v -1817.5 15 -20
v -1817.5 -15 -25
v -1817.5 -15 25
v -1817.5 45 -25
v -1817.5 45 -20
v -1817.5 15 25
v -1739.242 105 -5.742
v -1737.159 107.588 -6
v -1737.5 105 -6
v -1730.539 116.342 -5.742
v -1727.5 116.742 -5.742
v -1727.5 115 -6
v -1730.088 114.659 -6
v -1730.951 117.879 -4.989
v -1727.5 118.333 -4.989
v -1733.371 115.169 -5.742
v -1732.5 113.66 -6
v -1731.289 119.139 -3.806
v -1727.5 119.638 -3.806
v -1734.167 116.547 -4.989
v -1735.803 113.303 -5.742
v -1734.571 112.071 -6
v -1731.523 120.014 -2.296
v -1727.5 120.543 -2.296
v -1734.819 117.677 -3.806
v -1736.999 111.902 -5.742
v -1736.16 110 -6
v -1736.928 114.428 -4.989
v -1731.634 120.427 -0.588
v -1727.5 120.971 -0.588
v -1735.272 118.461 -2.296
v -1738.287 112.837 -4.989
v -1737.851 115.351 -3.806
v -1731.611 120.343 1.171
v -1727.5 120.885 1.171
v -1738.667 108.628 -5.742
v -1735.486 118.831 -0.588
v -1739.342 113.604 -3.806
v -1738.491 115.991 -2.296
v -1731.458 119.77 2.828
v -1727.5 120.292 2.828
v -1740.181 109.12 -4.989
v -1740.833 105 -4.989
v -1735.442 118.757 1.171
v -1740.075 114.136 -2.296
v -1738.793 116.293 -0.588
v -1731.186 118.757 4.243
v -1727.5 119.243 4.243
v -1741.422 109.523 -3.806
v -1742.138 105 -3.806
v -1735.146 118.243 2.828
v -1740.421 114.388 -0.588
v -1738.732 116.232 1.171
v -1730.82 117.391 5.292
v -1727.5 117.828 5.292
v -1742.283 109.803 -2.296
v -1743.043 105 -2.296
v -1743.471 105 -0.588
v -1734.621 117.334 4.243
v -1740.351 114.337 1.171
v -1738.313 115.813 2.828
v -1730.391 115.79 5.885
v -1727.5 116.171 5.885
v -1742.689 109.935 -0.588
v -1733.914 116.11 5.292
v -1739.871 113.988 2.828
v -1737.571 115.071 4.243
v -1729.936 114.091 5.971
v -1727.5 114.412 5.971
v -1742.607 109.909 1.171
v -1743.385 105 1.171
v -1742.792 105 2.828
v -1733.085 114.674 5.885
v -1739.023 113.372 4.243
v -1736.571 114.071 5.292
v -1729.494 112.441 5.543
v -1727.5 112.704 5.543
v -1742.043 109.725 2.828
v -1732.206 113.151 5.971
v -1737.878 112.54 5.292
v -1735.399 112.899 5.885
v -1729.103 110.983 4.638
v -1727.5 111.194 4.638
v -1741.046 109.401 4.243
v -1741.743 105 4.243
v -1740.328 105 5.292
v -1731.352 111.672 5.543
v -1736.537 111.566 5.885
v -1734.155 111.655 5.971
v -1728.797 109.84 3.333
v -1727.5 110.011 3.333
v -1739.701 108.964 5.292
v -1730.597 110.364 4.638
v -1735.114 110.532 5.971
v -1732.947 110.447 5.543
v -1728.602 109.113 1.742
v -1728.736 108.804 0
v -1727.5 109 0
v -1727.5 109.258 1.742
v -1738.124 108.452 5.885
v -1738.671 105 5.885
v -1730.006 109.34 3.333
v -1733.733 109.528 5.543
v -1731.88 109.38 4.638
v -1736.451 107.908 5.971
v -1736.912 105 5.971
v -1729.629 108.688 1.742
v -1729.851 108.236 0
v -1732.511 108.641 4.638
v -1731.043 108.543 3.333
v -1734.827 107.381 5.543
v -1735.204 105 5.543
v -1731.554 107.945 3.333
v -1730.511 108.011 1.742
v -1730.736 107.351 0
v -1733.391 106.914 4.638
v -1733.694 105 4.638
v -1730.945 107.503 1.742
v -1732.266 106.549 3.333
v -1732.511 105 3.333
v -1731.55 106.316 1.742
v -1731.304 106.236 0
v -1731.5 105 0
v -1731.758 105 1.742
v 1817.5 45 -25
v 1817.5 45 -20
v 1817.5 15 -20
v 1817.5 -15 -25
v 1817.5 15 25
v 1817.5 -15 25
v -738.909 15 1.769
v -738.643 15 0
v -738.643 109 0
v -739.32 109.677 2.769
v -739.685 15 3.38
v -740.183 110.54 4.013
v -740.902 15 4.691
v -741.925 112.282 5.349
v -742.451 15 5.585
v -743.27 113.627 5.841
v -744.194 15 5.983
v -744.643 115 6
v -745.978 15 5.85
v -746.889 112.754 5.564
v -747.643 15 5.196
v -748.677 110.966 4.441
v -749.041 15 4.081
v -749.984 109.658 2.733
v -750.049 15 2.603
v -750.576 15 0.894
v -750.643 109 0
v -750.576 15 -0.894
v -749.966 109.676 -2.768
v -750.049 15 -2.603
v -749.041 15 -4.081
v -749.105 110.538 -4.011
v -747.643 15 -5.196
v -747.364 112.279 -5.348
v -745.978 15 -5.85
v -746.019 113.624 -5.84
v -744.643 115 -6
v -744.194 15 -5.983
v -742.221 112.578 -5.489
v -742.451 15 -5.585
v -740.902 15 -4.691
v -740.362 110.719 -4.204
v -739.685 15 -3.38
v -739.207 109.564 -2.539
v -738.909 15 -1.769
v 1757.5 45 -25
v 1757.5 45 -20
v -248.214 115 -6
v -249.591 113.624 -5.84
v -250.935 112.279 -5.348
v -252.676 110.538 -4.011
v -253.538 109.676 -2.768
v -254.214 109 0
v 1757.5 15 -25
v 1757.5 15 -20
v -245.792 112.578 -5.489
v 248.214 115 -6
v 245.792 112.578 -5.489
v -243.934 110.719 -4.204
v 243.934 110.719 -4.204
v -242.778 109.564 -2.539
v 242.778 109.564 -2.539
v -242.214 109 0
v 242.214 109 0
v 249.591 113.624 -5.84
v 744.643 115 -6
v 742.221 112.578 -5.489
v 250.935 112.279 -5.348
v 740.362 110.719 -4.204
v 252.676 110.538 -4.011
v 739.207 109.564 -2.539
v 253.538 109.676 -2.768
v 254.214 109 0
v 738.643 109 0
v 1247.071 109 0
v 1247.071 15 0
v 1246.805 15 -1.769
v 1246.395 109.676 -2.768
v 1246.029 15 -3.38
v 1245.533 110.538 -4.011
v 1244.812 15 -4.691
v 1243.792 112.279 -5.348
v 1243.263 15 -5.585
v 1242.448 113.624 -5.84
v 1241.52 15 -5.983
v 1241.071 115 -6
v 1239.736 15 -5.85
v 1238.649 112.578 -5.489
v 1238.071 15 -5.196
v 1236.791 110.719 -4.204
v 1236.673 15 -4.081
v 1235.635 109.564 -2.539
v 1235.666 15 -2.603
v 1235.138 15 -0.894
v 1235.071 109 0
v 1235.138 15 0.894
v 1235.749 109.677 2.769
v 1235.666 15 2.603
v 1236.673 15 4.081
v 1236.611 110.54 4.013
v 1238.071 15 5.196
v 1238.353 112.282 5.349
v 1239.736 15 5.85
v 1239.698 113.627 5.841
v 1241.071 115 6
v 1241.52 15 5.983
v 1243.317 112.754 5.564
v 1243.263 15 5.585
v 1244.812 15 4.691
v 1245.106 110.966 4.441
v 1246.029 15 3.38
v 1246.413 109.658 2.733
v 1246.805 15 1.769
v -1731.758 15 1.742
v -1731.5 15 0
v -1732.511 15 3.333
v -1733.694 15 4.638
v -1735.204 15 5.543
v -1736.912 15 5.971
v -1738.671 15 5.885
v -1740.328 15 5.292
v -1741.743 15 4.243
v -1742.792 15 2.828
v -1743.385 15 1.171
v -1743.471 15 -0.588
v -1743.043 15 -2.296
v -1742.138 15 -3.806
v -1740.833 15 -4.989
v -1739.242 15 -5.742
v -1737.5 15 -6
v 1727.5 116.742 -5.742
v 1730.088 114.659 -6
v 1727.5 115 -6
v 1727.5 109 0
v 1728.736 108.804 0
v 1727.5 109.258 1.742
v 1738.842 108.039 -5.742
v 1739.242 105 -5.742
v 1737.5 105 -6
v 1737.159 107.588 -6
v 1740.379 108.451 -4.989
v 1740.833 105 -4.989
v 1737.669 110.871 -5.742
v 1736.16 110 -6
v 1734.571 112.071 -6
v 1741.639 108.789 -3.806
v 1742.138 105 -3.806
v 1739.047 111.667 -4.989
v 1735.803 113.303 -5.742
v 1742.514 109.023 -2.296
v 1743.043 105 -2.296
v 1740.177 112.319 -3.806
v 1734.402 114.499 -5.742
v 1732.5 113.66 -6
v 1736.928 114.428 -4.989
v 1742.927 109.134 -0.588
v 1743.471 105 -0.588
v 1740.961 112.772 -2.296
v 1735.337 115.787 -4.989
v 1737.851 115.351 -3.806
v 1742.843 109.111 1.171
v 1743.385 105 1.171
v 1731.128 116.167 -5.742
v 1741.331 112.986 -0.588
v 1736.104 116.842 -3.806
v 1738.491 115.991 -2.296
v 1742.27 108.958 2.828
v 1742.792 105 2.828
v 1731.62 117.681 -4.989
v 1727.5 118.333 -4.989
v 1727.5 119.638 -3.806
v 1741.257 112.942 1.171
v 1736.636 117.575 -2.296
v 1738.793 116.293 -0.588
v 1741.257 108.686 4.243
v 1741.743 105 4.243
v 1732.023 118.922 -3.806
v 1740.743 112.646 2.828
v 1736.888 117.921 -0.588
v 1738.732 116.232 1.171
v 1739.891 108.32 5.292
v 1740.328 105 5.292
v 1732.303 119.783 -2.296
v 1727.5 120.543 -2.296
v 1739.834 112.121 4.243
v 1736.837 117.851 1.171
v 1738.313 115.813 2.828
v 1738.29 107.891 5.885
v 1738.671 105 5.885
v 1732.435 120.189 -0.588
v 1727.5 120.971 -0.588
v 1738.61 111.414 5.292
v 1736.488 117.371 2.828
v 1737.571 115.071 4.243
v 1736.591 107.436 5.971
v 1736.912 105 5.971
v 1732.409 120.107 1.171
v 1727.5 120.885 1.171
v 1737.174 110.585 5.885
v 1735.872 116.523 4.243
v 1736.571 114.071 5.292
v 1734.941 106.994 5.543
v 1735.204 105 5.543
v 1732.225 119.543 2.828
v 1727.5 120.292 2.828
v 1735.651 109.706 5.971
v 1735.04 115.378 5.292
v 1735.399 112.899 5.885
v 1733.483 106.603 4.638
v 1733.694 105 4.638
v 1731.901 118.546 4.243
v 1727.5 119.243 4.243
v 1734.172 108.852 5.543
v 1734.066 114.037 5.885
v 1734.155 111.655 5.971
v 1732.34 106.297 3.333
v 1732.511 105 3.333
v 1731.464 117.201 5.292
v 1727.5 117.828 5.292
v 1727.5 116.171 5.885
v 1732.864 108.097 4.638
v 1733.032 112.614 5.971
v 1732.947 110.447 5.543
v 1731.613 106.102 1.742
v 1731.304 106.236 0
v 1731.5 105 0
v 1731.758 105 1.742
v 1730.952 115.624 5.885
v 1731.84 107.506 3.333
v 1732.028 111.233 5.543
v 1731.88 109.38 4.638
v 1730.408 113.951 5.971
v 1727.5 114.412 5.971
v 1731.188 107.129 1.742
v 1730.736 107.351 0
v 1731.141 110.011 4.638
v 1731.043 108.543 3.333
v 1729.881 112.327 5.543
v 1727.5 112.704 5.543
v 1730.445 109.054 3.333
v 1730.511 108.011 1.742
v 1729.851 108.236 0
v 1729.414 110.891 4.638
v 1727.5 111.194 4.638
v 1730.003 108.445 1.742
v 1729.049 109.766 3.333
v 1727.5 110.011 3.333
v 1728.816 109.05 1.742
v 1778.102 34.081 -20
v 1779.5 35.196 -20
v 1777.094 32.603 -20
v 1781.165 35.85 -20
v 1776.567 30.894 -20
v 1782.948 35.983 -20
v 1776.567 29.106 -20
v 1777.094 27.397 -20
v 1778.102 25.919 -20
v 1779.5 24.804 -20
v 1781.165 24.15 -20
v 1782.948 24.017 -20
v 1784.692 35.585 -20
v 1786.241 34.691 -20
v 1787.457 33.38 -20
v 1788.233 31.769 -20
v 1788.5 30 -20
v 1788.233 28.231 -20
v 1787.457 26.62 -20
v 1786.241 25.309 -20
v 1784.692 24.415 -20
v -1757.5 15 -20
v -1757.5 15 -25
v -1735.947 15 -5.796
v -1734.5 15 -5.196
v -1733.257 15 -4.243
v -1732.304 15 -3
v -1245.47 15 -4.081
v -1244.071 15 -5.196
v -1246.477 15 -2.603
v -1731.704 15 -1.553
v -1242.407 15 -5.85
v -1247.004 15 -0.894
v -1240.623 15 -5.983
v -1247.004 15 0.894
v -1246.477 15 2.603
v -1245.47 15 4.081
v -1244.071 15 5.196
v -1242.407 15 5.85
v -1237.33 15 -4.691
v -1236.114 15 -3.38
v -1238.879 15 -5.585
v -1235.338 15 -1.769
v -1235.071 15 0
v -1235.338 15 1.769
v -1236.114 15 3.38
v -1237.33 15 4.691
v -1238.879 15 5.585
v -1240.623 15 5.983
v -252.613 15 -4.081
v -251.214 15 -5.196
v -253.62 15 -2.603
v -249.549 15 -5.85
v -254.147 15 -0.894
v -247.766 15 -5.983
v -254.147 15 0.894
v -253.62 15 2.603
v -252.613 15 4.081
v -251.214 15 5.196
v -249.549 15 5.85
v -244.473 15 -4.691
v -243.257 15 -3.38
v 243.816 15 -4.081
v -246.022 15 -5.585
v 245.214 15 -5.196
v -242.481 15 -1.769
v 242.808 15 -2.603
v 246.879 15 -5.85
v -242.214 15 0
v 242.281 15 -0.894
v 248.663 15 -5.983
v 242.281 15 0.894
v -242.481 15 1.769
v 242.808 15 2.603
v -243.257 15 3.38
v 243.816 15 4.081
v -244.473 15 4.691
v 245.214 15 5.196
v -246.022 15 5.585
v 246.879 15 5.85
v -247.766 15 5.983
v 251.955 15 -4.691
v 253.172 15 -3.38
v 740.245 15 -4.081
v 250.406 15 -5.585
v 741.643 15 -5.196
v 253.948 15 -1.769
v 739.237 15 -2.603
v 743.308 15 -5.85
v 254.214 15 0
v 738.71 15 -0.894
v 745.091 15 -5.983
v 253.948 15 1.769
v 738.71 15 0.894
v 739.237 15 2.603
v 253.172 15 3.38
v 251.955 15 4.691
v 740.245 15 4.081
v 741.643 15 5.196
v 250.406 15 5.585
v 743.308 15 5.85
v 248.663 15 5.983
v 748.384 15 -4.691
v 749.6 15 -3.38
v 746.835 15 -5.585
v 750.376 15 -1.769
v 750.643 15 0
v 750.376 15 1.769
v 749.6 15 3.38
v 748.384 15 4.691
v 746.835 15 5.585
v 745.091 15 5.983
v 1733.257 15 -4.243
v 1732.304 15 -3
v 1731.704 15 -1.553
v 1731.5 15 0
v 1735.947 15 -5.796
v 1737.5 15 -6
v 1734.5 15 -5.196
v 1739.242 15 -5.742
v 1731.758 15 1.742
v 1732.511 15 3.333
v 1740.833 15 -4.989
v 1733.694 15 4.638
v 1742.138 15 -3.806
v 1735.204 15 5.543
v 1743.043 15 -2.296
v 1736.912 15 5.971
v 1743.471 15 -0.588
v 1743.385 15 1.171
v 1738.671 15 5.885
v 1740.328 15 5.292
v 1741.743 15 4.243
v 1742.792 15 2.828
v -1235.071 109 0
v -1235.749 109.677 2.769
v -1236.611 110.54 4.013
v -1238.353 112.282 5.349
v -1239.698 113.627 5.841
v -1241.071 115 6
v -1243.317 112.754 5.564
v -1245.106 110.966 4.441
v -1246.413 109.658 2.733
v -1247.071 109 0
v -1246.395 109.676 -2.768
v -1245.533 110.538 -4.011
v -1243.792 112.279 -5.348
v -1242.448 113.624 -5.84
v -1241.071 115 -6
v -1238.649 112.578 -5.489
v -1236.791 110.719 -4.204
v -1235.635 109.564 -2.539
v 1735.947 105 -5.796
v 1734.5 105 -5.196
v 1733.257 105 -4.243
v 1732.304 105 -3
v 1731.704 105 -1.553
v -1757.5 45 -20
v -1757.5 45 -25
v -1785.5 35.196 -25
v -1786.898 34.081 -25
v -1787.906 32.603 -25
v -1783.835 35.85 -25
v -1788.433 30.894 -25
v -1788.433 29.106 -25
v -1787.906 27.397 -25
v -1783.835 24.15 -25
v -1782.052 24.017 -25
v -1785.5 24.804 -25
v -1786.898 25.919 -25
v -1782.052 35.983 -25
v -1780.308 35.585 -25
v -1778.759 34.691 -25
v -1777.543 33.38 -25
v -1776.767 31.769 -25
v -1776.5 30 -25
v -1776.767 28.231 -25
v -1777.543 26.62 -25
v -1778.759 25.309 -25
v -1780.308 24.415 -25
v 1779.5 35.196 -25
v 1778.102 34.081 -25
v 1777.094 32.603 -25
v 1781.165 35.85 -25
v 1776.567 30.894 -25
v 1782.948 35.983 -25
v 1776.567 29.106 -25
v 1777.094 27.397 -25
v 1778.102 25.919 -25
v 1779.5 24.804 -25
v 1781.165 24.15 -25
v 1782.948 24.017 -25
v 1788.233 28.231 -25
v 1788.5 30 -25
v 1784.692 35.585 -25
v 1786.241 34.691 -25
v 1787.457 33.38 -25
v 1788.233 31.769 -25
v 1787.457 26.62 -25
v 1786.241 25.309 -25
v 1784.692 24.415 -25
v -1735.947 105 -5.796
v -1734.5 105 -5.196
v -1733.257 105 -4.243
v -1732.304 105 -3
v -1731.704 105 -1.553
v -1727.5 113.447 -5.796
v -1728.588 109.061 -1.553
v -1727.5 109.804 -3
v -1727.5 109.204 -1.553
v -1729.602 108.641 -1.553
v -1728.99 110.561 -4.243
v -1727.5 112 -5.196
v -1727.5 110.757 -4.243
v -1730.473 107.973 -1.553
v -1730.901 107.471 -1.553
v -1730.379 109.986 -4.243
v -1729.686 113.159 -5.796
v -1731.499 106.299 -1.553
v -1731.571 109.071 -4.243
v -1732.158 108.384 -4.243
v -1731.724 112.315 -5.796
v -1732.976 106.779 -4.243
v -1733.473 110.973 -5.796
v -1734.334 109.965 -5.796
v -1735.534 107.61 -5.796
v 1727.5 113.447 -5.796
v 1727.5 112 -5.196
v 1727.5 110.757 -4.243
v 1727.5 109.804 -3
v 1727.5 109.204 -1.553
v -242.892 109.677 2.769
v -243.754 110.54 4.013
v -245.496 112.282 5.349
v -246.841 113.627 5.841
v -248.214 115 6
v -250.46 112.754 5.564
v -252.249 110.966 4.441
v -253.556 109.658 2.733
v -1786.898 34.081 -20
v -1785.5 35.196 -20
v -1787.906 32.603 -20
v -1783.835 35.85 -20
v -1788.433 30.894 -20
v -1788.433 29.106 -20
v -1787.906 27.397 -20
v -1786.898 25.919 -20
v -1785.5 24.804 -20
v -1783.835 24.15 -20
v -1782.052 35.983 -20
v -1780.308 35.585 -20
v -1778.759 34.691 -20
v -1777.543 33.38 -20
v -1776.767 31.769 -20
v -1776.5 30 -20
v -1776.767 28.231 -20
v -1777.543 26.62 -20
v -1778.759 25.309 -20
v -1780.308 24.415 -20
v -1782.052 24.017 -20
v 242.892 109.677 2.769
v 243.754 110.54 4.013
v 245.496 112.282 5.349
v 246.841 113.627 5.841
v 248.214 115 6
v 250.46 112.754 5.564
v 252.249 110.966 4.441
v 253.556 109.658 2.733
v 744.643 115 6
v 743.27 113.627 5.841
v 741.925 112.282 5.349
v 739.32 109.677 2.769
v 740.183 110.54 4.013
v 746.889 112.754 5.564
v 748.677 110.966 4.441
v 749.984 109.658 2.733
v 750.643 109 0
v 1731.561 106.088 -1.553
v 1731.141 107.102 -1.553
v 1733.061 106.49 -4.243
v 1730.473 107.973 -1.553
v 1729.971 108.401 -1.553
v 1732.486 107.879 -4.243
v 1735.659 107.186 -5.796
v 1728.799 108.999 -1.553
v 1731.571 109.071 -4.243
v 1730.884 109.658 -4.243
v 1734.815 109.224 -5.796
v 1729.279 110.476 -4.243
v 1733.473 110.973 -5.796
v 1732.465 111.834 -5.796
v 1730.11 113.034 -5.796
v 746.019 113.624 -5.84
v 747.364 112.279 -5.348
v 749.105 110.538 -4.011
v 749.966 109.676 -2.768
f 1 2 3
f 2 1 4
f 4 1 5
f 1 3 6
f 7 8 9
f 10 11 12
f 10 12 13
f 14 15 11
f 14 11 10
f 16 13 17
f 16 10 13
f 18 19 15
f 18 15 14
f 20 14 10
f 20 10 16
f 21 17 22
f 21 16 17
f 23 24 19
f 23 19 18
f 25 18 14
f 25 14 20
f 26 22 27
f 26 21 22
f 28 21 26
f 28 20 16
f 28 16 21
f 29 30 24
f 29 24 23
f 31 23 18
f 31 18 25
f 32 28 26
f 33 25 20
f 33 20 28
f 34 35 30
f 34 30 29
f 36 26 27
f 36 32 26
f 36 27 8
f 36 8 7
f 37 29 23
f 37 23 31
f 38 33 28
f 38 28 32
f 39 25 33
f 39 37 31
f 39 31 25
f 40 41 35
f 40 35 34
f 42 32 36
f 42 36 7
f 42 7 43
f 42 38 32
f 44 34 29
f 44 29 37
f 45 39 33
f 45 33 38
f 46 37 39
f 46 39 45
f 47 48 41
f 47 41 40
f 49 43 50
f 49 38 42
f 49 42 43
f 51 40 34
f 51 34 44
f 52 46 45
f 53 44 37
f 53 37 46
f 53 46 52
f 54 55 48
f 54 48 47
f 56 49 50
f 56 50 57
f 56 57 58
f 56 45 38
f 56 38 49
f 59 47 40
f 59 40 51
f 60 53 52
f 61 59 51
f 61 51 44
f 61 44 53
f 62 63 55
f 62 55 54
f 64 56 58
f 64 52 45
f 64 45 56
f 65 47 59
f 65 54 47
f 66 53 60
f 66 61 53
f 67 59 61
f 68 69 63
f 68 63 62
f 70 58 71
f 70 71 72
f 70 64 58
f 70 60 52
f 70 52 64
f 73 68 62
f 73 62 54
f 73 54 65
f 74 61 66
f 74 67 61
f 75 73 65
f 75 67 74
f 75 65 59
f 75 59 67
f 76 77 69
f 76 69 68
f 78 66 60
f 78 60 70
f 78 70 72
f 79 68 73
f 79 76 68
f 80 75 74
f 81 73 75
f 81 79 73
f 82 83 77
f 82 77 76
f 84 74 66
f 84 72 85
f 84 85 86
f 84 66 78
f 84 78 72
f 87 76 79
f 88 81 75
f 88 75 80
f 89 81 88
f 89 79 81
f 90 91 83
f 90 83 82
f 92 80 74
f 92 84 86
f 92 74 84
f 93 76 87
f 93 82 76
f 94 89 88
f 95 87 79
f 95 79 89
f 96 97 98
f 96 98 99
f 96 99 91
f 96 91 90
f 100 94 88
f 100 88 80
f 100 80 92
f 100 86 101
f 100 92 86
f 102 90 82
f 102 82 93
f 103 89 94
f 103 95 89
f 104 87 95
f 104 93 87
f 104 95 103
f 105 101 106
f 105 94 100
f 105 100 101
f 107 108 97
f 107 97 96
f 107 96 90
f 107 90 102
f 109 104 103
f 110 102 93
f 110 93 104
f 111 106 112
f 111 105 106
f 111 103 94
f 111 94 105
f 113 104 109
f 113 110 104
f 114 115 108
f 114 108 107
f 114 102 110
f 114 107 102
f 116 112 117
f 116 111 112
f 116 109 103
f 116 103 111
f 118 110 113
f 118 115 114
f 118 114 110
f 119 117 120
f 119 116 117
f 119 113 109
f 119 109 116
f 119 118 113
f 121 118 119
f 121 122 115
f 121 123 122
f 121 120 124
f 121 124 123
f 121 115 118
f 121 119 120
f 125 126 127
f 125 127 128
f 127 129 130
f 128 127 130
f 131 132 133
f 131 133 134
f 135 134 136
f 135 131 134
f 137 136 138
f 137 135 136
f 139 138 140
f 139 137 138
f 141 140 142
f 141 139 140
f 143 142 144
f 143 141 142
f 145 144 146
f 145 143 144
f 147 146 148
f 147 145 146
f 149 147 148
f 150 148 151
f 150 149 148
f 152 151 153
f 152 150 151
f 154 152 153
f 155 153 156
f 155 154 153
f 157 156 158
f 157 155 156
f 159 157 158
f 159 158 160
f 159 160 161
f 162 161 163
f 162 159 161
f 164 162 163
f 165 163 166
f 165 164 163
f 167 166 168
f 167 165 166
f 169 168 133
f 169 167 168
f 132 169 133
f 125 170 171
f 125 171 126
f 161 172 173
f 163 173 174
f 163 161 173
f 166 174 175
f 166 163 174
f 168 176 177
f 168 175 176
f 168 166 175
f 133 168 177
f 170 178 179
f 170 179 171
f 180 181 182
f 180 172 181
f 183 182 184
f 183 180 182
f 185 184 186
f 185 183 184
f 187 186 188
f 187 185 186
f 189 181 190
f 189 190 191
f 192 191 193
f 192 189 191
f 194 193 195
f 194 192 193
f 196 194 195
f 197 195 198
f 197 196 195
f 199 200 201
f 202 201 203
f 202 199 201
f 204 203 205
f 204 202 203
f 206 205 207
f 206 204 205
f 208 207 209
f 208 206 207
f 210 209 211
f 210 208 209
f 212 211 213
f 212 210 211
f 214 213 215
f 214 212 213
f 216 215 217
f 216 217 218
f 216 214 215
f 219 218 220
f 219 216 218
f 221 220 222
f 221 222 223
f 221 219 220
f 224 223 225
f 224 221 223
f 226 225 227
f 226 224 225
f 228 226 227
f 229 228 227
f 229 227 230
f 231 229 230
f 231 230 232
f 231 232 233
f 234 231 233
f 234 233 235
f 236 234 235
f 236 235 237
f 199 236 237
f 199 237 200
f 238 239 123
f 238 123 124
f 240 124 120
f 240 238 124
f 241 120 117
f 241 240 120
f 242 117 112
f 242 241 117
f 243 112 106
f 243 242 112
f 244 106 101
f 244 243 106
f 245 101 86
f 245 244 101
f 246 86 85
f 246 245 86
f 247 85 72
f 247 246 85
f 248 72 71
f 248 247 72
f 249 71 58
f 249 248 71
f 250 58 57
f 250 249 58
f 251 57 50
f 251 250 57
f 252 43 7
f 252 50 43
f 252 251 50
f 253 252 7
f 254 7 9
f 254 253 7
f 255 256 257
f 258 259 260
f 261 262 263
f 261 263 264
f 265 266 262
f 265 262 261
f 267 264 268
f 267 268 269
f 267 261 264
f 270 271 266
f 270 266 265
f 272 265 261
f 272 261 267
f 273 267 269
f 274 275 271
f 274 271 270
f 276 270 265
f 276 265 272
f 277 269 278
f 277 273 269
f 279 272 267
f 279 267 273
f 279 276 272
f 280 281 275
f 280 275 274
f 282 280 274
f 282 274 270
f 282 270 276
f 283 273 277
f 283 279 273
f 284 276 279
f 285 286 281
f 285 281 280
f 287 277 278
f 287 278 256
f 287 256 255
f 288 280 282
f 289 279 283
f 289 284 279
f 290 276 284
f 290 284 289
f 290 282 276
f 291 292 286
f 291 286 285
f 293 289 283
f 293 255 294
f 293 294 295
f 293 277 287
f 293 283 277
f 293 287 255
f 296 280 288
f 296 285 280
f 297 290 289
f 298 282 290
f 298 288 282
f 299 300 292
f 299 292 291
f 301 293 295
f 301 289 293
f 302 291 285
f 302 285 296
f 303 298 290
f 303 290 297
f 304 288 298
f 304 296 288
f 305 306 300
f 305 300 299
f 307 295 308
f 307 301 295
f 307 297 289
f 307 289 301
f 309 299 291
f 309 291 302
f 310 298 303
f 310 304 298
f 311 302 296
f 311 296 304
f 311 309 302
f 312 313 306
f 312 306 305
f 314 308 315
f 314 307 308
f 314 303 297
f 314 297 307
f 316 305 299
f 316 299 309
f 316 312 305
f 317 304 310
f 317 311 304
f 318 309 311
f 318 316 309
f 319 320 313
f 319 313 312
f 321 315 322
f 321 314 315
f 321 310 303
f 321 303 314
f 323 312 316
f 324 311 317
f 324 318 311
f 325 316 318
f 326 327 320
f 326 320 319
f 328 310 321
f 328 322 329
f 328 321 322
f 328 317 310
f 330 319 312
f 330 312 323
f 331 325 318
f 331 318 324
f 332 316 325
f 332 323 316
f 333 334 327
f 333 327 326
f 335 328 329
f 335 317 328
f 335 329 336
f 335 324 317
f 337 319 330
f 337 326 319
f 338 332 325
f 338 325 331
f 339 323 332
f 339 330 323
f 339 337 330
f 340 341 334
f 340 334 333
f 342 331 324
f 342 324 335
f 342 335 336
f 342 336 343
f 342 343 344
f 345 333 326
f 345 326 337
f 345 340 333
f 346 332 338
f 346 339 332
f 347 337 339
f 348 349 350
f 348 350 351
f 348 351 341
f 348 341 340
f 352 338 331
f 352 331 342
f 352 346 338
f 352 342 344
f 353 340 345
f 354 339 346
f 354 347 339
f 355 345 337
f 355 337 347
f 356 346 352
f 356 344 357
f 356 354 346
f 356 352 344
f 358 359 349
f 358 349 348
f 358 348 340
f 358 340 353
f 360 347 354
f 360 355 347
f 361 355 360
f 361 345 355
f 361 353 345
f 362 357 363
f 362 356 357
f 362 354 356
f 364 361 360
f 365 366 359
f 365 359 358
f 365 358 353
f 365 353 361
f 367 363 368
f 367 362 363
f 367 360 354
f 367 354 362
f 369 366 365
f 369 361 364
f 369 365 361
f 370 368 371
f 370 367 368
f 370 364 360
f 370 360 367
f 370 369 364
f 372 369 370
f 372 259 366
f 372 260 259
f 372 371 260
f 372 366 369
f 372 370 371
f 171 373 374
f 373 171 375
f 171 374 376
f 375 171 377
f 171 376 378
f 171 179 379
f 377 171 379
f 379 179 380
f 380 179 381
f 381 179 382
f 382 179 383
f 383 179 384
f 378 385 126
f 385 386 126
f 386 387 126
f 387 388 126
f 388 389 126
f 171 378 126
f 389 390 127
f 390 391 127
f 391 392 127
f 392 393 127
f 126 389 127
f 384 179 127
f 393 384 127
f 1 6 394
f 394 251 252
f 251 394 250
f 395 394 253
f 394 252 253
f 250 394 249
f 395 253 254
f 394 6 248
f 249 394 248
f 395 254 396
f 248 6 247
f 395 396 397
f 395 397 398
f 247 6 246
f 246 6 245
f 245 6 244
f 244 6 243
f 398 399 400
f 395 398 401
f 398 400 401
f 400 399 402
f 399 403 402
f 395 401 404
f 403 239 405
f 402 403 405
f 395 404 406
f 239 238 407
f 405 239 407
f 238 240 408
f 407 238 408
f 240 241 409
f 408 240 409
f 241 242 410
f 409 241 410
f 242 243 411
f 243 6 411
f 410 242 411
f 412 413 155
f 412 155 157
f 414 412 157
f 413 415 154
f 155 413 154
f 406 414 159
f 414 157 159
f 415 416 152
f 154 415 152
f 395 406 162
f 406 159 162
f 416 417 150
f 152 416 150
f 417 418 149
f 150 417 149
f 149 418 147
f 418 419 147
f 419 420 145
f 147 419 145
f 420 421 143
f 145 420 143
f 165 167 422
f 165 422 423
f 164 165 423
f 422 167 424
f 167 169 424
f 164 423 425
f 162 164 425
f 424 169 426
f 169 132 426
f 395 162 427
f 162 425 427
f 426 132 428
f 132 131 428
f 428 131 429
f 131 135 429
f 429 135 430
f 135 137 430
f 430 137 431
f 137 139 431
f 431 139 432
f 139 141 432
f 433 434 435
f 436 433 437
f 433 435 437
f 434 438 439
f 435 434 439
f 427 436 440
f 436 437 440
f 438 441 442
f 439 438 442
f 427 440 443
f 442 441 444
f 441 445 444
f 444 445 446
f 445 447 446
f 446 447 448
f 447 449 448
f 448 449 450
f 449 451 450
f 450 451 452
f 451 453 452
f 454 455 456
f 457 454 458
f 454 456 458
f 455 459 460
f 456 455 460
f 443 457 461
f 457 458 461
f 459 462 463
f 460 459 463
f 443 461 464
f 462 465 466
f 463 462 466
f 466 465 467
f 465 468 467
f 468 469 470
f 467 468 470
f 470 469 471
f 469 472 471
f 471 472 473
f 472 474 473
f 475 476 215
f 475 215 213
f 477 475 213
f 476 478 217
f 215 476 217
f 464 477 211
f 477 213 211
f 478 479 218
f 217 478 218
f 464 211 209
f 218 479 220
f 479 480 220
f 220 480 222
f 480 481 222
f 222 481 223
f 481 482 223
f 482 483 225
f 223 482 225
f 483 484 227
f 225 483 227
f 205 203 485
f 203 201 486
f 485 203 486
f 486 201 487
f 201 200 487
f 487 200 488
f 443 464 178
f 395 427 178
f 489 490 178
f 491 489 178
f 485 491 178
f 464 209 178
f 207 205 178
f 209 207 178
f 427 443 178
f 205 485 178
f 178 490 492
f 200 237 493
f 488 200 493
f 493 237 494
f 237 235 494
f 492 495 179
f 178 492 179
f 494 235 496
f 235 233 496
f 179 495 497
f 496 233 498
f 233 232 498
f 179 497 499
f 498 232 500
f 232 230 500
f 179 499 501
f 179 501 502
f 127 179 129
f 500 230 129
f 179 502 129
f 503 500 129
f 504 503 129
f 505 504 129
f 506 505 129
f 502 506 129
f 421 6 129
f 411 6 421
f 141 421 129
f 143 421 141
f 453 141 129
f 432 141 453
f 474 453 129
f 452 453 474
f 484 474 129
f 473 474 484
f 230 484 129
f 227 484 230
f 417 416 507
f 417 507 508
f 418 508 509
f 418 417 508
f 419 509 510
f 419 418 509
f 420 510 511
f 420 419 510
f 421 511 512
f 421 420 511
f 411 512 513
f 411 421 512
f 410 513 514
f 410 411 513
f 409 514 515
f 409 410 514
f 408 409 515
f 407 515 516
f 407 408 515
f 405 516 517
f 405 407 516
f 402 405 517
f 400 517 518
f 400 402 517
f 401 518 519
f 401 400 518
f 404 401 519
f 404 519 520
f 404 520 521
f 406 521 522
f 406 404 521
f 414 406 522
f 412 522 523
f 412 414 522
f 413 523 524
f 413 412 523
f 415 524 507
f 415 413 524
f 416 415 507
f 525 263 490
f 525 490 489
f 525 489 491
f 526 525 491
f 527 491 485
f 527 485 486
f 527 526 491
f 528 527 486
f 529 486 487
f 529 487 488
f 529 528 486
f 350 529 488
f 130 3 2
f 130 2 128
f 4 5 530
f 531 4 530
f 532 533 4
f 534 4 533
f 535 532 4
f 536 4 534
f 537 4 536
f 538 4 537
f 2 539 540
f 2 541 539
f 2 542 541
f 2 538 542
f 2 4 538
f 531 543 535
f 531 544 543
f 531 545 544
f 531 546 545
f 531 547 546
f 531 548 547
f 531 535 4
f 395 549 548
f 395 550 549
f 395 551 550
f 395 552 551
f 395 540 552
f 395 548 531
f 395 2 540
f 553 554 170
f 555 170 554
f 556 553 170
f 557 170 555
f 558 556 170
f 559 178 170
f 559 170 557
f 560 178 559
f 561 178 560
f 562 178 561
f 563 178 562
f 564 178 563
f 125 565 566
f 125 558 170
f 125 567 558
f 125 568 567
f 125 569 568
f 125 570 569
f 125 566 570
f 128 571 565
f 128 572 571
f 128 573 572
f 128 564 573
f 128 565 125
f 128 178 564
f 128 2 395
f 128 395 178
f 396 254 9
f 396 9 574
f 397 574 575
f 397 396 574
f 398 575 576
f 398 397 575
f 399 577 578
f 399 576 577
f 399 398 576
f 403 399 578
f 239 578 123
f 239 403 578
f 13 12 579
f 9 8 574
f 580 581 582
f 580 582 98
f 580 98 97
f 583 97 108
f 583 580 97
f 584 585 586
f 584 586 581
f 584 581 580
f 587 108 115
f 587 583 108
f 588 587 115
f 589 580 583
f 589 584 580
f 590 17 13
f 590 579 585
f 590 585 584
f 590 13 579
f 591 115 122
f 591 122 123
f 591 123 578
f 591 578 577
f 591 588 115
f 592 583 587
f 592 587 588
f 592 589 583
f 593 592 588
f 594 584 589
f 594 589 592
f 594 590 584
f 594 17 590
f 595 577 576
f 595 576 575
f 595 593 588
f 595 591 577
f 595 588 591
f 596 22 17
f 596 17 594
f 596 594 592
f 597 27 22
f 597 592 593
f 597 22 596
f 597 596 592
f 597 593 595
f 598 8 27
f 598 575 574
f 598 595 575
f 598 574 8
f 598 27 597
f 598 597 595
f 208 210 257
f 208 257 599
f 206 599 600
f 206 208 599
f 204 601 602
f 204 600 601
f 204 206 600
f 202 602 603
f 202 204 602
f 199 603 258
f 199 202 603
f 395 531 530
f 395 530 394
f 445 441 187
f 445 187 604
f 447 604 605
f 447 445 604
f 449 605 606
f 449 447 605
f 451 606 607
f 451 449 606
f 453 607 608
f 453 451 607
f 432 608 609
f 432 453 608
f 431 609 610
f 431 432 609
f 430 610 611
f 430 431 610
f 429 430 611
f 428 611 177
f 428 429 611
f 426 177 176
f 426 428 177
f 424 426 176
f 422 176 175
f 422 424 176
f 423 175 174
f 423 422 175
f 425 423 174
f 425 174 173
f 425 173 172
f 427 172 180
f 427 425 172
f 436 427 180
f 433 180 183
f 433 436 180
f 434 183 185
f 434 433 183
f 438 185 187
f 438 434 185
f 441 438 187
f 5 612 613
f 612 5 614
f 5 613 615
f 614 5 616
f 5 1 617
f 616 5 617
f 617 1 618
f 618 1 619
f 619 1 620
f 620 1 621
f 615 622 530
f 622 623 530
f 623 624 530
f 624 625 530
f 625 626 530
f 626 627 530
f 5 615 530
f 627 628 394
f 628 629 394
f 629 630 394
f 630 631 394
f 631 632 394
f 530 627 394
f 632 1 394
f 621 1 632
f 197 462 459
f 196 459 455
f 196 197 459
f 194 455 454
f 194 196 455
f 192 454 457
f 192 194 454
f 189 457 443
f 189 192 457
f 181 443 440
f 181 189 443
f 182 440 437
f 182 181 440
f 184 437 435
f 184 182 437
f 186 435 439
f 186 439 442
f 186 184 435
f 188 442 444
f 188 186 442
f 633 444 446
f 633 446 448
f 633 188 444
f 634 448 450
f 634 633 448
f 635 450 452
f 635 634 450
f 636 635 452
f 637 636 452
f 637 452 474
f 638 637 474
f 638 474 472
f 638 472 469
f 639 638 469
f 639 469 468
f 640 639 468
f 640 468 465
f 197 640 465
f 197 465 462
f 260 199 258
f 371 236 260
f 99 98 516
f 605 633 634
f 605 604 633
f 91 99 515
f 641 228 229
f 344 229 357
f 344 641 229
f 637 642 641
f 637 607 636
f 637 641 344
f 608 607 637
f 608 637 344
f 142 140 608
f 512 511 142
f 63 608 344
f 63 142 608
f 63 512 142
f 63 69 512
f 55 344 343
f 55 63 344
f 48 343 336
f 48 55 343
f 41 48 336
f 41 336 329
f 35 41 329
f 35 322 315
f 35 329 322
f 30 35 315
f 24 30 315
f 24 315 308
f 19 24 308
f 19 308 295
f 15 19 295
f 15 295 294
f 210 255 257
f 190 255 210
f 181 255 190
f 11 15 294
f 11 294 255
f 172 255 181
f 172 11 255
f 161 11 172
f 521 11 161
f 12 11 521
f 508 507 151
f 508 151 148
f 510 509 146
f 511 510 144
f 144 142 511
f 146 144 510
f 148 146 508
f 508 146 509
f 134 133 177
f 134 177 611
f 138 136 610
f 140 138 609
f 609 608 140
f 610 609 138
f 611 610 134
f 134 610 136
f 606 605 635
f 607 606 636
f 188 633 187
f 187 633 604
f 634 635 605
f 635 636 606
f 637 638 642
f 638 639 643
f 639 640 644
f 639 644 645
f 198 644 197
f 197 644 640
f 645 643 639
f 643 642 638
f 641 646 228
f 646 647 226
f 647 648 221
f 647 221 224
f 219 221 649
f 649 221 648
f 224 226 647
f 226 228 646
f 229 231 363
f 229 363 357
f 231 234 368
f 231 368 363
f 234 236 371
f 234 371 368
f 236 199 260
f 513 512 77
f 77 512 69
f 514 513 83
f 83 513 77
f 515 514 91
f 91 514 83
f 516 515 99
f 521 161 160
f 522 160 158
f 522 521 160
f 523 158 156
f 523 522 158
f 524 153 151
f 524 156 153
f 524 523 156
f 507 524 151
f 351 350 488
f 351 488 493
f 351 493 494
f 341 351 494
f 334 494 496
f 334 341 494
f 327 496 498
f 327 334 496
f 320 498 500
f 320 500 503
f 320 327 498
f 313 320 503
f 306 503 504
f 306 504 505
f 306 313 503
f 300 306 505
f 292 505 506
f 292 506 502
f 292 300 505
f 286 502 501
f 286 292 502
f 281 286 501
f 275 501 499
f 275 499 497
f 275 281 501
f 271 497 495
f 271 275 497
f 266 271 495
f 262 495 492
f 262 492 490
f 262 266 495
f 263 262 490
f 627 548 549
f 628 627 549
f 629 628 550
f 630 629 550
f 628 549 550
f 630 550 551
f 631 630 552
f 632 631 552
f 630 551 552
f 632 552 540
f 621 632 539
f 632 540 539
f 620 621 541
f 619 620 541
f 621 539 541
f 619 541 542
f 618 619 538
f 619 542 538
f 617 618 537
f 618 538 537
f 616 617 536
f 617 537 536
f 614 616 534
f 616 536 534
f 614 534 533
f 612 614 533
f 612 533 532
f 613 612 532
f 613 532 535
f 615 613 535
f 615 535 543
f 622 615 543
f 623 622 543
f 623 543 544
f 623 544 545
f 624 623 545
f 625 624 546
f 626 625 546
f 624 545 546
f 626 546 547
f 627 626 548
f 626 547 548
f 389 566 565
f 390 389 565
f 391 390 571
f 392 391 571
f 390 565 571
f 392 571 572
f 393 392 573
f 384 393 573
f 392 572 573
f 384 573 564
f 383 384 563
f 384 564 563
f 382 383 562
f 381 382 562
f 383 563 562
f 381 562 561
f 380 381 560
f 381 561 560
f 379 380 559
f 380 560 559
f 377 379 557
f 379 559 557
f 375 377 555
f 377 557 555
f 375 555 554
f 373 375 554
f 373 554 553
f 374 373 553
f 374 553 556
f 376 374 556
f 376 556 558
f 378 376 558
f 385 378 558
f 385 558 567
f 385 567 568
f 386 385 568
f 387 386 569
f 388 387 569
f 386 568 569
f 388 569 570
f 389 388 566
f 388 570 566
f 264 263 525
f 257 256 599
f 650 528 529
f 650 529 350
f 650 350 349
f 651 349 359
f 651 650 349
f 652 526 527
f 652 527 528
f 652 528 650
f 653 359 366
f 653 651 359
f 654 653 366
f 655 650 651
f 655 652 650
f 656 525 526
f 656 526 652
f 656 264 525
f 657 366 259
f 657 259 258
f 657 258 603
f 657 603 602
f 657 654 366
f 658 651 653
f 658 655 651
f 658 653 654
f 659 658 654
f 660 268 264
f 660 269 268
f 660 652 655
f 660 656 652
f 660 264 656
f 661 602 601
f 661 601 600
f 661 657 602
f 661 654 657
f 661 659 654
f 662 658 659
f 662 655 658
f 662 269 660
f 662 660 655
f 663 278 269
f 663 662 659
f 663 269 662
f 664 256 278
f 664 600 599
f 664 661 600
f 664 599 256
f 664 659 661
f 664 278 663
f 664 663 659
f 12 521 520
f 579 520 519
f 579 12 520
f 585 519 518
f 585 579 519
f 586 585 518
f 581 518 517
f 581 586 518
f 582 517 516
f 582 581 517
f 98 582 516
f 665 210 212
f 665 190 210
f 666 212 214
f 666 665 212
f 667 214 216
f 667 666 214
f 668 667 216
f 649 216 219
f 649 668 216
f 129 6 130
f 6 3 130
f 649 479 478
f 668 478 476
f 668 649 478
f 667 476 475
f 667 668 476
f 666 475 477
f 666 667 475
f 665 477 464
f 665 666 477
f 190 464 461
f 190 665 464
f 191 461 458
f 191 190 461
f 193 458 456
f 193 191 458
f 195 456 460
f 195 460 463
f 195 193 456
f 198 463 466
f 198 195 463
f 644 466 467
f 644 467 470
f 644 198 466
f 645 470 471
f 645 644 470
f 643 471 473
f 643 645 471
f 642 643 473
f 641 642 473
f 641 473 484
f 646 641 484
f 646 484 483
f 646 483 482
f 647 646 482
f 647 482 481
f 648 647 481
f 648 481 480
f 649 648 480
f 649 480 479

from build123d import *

# Parameters (mm, degrees)
F0_W          = 3635
F0_H          = 50
F1_DEPTH      = 15
F1_DEPTH_BACK = 15
F2_W          = 60
F2_H          = 30
F3_DEPTH      = 5
F4_W          = 60
F4_H          = 30
F4_H_2        = 15
F5_DEPTH      = 5
F6_R          = 6
F7_DEPTH      = 5
F9_DEPTH      = 5
F10_DEPTH     = 5
F11_DEPTH     = 5


# Not quite as in the source:
# - a feature names something its author has since deleted; it is built from what else it names


with BuildPart() as f1:
    # F0 (on Front) → F1 (new body, two sides)
    with BuildSketch(Plane.XZ) as f1_sk:
        Rectangle(F0_W, F0_H)
    extrude(amount=F1_DEPTH)
    extrude(f1_sk.sketch, amount=-F1_DEPTH_BACK)

    # F2 (on face) → F3 (join)
    with BuildSketch(Plane(origin=(0, 0, -25), x_dir=(1, 0, 0), z_dir=(0, 0, -1))):
        with Locations((-1787.5, -30)):
            Rectangle(F2_W, F2_H)
        Polygon((-1757.5, 15), (-1817.5, 15), (-1817.5, 0), (-1817.5, -15), (-1757.5, -15), align=None)
    extrude(amount=F3_DEPTH)

    # F4 (on face) → F5 (join)
    with BuildSketch(Plane(origin=(0, 0, -25), x_dir=(1, 0, 0), z_dir=(0, 0, -1))):
        with Locations((1787.5, -30)):
            Rectangle(F4_W, F4_H)
        with Locations((1787.5, -7.5)):
            Rectangle(F4_W, F4_H_2)
        with Locations((1787.5, 7.5)):
            Rectangle(F4_W, F4_H_2)
    extrude(amount=F5_DEPTH)

    # F6 (on face) → F7 (cut, through all)
    with BuildSketch(Plane(origin=(0, 0, -30), x_dir=(1, 0, 0), z_dir=(0, 0, -1))):
        with Locations((1782.5, -30)):
            Circle(F6_R)
    extrude(amount=-F7_DEPTH, mode=Mode.SUBTRACT)

    # F8 (on face) → F9 (cut, through all)
    with BuildSketch(Plane(origin=(0, 0, -30), x_dir=(1, 0, 0), z_dir=(0, 0, -1))):
        with BuildLine():
            ThreePointArc((-1788.5, -30), (-1782.5, -36), (-1776.5, -30))
            ThreePointArc((-1776.5, -30), (-1782.5, -24), (-1788.5, -30))
        make_face()
    extrude(amount=-F9_DEPTH, mode=Mode.SUBTRACT)

    # F10 (add): faces of the model
    f10_faces = [f1.faces().sort_by_distance(p)[0] for p in [
        (1787.5, 44.3291796068, -25),
        (-1816.8291796068, 30, -25),
    ]]
    extrude(f10_faces, amount=F10_DEPTH)

    # F11 (cut): faces of the model
    f11_faces = [f1.faces().sort_by_distance(p)[0] for p in [
        (-1787.6621744947, 14.5134765159, -30),
        (1787.6621744947, 14.5134765159, -30),
    ]]
    extrude(f11_faces, amount=-F11_DEPTH, mode=Mode.SUBTRACT)

    # F14: sweep along a path in F13
    with BuildLine(Plane.XY) as f14_path:
        Line((1737.5, 15), (1737.5, 105))
        ThreePointArc((1737.5, 105), (1734.5710678119, 112.0710678119), (1727.5, 115))
        Line((1727.5, 115), (-1727.5, 115))
        ThreePointArc((-1727.5, 115), (-1734.5710678119, 112.0710678119), (-1737.5, 105))
        Line((-1737.5, 105), (-1737.5, 15))
    # F12 (on face) → F14 (sweep)
    with BuildSketch(Plane(origin=(0, 15, 0), x_dir=(-1, 0, 0), z_dir=(0, 1, 0))):
        with BuildLine():
            ThreePointArc((-1731.5, 0), (-1741.7426406871, 4.2426406871), (-1737.5, -6))
            Line((-1737.5, -6), (-1737.5, 0))
            Line((-1737.5, 0), (-1731.5, 0))
        make_face()
        with BuildLine():
            Line((-1737.5, 0), (-1737.5, -6))
            ThreePointArc((-1737.5, -6), (-1733.2573593129, -4.2426406871), (-1731.5, 0))
            Line((-1731.5, 0), (-1737.5, 0))
        make_face()
    sweep(path=f14_path.line)

    # F15: sweep along a path in F13
    with BuildLine(Plane.XY) as f15_path:
        Line((-1241.0714285714, 115), (-1241.0714285714, 15))
    # F12 (on face) → F15 (sweep)
    with BuildSketch(Plane(origin=(0, 15, 0), x_dir=(-1, 0, 0), z_dir=(0, 1, 0))):
        with BuildLine():
            ThreePointArc((1247.0714285714, 0), (1241.0714285714, 6), (1235.0714285714, 0))
            Line((1235.0714285714, 0), (1241.0714285714, 0))
            Line((1241.0714285714, 0), (1247.0714285714, 0))
        make_face()
        with BuildLine():
            Line((1241.0714285714, 0), (1235.0714285714, 0))
            ThreePointArc((1235.0714285714, 0), (1241.0714285714, -6), (1247.0714285714, 0))
            Line((1247.0714285714, 0), (1241.0714285714, 0))
        make_face()
    sweep(path=f15_path.line)

    # F16: sweep along a path in F13
    with BuildLine(Plane.XY) as f16_path:
        Line((-744.6428571429, 115), (-744.6428571429, 15))
    # F12 (on face) → F16 (sweep)
    with BuildSketch(Plane(origin=(0, 15, 0), x_dir=(-1, 0, 0), z_dir=(0, 1, 0))):
        with BuildLine():
            ThreePointArc((750.6428571429, 0), (744.6428571429, 6), (738.6428571429, 0))
            Line((738.6428571429, 0), (744.6428571429, 0))
            Line((744.6428571429, 0), (750.6428571429, 0))
        make_face()
        with BuildLine():
            Line((744.6428571429, 0), (738.6428571429, 0))
            ThreePointArc((738.6428571429, 0), (744.6428571429, -6), (750.6428571429, 0))
            Line((750.6428571429, 0), (744.6428571429, 0))
        make_face()
    sweep(path=f16_path.line)

    # F17: sweep along a path in F13
    with BuildLine(Plane.XY) as f17_path:
        Line((-248.2142857143, 115), (-248.2142857143, 15))
    # F12 (on face) → F17 (sweep)
    with BuildSketch(Plane(origin=(0, 15, 0), x_dir=(-1, 0, 0), z_dir=(0, 1, 0))):
        with BuildLine():
            ThreePointArc((254.2142857143, 0), (248.2142857143, 6), (242.2142857143, 0))
            Line((242.2142857143, 0), (248.2142857143, 0))
            Line((248.2142857143, 0), (254.2142857143, 0))
        make_face()
        with BuildLine():
            Line((248.2142857143, 0), (242.2142857143, 0))
            ThreePointArc((242.2142857143, 0), (248.2142857143, -6), (254.2142857143, 0))
            Line((254.2142857143, 0), (248.2142857143, 0))
        make_face()
    sweep(path=f17_path.line)

    # F18: sweep along a path in F13
    with BuildLine(Plane.XY) as f18_path:
        Line((248.2142857143, 15), (248.2142857143, 115))
    # F12 (on face) → F18 (sweep)
    with BuildSketch(Plane(origin=(0, 15, 0), x_dir=(-1, 0, 0), z_dir=(0, 1, 0))):
        with BuildLine():
            ThreePointArc((-242.2142857143, 0), (-248.2142857143, 6), (-254.2142857143, 0))
            Line((-254.2142857143, 0), (-248.2142857143, 0))
            Line((-248.2142857143, 0), (-242.2142857143, 0))
        make_face()
        with BuildLine():
            Line((-248.2142857143, 0), (-254.2142857143, 0))
            ThreePointArc((-254.2142857143, 0), (-248.2142857143, -6), (-242.2142857143, 0))
            Line((-242.2142857143, 0), (-248.2142857143, 0))
        make_face()
    sweep(path=f18_path.line)

    # F19: sweep along a path in F13
    with BuildLine(Plane.XY) as f19_path:
        Line((744.6428571429, 15), (744.6428571429, 115))
    # F12 (on face) → F19 (sweep)
    with BuildSketch(Plane(origin=(0, 15, 0), x_dir=(-1, 0, 0), z_dir=(0, 1, 0))):
        with BuildLine():
            ThreePointArc((-738.6428571429, 0), (-744.6428571429, 6), (-750.6428571429, 0))
            Line((-750.6428571429, 0), (-744.6428571429, 0))
            Line((-744.6428571429, 0), (-738.6428571429, 0))
        make_face()
        with BuildLine():
            Line((-744.6428571429, 0), (-750.6428571429, 0))
            ThreePointArc((-750.6428571429, 0), (-744.6428571429, -6), (-738.6428571429, 0))
            Line((-738.6428571429, 0), (-744.6428571429, 0))
        make_face()
    sweep(path=f19_path.line)

    # F20: sweep along a path in F13
    with BuildLine(Plane.XY) as f20_path:
        Line((1241.0714285714, 15), (1241.0714285714, 115))
    # F12 (on face) → F20 (sweep)
    with BuildSketch(Plane(origin=(0, 15, 0), x_dir=(-1, 0, 0), z_dir=(0, 1, 0))):
        with BuildLine():
            ThreePointArc((-1235.0714285714, 0), (-1241.0714285714, 6), (-1247.0714285714, 0))
            Line((-1247.0714285714, 0), (-1241.0714285714, 0))
            Line((-1241.0714285714, 0), (-1235.0714285714, 0))
        make_face()
        with BuildLine():
            Line((-1241.0714285714, 0), (-1247.0714285714, 0))
            ThreePointArc((-1247.0714285714, 0), (-1241.0714285714, -6), (-1235.0714285714, 0))
            Line((-1235.0714285714, 0), (-1241.0714285714, 0))
        make_face()
    sweep(path=f20_path.line)


solid = f1.part
